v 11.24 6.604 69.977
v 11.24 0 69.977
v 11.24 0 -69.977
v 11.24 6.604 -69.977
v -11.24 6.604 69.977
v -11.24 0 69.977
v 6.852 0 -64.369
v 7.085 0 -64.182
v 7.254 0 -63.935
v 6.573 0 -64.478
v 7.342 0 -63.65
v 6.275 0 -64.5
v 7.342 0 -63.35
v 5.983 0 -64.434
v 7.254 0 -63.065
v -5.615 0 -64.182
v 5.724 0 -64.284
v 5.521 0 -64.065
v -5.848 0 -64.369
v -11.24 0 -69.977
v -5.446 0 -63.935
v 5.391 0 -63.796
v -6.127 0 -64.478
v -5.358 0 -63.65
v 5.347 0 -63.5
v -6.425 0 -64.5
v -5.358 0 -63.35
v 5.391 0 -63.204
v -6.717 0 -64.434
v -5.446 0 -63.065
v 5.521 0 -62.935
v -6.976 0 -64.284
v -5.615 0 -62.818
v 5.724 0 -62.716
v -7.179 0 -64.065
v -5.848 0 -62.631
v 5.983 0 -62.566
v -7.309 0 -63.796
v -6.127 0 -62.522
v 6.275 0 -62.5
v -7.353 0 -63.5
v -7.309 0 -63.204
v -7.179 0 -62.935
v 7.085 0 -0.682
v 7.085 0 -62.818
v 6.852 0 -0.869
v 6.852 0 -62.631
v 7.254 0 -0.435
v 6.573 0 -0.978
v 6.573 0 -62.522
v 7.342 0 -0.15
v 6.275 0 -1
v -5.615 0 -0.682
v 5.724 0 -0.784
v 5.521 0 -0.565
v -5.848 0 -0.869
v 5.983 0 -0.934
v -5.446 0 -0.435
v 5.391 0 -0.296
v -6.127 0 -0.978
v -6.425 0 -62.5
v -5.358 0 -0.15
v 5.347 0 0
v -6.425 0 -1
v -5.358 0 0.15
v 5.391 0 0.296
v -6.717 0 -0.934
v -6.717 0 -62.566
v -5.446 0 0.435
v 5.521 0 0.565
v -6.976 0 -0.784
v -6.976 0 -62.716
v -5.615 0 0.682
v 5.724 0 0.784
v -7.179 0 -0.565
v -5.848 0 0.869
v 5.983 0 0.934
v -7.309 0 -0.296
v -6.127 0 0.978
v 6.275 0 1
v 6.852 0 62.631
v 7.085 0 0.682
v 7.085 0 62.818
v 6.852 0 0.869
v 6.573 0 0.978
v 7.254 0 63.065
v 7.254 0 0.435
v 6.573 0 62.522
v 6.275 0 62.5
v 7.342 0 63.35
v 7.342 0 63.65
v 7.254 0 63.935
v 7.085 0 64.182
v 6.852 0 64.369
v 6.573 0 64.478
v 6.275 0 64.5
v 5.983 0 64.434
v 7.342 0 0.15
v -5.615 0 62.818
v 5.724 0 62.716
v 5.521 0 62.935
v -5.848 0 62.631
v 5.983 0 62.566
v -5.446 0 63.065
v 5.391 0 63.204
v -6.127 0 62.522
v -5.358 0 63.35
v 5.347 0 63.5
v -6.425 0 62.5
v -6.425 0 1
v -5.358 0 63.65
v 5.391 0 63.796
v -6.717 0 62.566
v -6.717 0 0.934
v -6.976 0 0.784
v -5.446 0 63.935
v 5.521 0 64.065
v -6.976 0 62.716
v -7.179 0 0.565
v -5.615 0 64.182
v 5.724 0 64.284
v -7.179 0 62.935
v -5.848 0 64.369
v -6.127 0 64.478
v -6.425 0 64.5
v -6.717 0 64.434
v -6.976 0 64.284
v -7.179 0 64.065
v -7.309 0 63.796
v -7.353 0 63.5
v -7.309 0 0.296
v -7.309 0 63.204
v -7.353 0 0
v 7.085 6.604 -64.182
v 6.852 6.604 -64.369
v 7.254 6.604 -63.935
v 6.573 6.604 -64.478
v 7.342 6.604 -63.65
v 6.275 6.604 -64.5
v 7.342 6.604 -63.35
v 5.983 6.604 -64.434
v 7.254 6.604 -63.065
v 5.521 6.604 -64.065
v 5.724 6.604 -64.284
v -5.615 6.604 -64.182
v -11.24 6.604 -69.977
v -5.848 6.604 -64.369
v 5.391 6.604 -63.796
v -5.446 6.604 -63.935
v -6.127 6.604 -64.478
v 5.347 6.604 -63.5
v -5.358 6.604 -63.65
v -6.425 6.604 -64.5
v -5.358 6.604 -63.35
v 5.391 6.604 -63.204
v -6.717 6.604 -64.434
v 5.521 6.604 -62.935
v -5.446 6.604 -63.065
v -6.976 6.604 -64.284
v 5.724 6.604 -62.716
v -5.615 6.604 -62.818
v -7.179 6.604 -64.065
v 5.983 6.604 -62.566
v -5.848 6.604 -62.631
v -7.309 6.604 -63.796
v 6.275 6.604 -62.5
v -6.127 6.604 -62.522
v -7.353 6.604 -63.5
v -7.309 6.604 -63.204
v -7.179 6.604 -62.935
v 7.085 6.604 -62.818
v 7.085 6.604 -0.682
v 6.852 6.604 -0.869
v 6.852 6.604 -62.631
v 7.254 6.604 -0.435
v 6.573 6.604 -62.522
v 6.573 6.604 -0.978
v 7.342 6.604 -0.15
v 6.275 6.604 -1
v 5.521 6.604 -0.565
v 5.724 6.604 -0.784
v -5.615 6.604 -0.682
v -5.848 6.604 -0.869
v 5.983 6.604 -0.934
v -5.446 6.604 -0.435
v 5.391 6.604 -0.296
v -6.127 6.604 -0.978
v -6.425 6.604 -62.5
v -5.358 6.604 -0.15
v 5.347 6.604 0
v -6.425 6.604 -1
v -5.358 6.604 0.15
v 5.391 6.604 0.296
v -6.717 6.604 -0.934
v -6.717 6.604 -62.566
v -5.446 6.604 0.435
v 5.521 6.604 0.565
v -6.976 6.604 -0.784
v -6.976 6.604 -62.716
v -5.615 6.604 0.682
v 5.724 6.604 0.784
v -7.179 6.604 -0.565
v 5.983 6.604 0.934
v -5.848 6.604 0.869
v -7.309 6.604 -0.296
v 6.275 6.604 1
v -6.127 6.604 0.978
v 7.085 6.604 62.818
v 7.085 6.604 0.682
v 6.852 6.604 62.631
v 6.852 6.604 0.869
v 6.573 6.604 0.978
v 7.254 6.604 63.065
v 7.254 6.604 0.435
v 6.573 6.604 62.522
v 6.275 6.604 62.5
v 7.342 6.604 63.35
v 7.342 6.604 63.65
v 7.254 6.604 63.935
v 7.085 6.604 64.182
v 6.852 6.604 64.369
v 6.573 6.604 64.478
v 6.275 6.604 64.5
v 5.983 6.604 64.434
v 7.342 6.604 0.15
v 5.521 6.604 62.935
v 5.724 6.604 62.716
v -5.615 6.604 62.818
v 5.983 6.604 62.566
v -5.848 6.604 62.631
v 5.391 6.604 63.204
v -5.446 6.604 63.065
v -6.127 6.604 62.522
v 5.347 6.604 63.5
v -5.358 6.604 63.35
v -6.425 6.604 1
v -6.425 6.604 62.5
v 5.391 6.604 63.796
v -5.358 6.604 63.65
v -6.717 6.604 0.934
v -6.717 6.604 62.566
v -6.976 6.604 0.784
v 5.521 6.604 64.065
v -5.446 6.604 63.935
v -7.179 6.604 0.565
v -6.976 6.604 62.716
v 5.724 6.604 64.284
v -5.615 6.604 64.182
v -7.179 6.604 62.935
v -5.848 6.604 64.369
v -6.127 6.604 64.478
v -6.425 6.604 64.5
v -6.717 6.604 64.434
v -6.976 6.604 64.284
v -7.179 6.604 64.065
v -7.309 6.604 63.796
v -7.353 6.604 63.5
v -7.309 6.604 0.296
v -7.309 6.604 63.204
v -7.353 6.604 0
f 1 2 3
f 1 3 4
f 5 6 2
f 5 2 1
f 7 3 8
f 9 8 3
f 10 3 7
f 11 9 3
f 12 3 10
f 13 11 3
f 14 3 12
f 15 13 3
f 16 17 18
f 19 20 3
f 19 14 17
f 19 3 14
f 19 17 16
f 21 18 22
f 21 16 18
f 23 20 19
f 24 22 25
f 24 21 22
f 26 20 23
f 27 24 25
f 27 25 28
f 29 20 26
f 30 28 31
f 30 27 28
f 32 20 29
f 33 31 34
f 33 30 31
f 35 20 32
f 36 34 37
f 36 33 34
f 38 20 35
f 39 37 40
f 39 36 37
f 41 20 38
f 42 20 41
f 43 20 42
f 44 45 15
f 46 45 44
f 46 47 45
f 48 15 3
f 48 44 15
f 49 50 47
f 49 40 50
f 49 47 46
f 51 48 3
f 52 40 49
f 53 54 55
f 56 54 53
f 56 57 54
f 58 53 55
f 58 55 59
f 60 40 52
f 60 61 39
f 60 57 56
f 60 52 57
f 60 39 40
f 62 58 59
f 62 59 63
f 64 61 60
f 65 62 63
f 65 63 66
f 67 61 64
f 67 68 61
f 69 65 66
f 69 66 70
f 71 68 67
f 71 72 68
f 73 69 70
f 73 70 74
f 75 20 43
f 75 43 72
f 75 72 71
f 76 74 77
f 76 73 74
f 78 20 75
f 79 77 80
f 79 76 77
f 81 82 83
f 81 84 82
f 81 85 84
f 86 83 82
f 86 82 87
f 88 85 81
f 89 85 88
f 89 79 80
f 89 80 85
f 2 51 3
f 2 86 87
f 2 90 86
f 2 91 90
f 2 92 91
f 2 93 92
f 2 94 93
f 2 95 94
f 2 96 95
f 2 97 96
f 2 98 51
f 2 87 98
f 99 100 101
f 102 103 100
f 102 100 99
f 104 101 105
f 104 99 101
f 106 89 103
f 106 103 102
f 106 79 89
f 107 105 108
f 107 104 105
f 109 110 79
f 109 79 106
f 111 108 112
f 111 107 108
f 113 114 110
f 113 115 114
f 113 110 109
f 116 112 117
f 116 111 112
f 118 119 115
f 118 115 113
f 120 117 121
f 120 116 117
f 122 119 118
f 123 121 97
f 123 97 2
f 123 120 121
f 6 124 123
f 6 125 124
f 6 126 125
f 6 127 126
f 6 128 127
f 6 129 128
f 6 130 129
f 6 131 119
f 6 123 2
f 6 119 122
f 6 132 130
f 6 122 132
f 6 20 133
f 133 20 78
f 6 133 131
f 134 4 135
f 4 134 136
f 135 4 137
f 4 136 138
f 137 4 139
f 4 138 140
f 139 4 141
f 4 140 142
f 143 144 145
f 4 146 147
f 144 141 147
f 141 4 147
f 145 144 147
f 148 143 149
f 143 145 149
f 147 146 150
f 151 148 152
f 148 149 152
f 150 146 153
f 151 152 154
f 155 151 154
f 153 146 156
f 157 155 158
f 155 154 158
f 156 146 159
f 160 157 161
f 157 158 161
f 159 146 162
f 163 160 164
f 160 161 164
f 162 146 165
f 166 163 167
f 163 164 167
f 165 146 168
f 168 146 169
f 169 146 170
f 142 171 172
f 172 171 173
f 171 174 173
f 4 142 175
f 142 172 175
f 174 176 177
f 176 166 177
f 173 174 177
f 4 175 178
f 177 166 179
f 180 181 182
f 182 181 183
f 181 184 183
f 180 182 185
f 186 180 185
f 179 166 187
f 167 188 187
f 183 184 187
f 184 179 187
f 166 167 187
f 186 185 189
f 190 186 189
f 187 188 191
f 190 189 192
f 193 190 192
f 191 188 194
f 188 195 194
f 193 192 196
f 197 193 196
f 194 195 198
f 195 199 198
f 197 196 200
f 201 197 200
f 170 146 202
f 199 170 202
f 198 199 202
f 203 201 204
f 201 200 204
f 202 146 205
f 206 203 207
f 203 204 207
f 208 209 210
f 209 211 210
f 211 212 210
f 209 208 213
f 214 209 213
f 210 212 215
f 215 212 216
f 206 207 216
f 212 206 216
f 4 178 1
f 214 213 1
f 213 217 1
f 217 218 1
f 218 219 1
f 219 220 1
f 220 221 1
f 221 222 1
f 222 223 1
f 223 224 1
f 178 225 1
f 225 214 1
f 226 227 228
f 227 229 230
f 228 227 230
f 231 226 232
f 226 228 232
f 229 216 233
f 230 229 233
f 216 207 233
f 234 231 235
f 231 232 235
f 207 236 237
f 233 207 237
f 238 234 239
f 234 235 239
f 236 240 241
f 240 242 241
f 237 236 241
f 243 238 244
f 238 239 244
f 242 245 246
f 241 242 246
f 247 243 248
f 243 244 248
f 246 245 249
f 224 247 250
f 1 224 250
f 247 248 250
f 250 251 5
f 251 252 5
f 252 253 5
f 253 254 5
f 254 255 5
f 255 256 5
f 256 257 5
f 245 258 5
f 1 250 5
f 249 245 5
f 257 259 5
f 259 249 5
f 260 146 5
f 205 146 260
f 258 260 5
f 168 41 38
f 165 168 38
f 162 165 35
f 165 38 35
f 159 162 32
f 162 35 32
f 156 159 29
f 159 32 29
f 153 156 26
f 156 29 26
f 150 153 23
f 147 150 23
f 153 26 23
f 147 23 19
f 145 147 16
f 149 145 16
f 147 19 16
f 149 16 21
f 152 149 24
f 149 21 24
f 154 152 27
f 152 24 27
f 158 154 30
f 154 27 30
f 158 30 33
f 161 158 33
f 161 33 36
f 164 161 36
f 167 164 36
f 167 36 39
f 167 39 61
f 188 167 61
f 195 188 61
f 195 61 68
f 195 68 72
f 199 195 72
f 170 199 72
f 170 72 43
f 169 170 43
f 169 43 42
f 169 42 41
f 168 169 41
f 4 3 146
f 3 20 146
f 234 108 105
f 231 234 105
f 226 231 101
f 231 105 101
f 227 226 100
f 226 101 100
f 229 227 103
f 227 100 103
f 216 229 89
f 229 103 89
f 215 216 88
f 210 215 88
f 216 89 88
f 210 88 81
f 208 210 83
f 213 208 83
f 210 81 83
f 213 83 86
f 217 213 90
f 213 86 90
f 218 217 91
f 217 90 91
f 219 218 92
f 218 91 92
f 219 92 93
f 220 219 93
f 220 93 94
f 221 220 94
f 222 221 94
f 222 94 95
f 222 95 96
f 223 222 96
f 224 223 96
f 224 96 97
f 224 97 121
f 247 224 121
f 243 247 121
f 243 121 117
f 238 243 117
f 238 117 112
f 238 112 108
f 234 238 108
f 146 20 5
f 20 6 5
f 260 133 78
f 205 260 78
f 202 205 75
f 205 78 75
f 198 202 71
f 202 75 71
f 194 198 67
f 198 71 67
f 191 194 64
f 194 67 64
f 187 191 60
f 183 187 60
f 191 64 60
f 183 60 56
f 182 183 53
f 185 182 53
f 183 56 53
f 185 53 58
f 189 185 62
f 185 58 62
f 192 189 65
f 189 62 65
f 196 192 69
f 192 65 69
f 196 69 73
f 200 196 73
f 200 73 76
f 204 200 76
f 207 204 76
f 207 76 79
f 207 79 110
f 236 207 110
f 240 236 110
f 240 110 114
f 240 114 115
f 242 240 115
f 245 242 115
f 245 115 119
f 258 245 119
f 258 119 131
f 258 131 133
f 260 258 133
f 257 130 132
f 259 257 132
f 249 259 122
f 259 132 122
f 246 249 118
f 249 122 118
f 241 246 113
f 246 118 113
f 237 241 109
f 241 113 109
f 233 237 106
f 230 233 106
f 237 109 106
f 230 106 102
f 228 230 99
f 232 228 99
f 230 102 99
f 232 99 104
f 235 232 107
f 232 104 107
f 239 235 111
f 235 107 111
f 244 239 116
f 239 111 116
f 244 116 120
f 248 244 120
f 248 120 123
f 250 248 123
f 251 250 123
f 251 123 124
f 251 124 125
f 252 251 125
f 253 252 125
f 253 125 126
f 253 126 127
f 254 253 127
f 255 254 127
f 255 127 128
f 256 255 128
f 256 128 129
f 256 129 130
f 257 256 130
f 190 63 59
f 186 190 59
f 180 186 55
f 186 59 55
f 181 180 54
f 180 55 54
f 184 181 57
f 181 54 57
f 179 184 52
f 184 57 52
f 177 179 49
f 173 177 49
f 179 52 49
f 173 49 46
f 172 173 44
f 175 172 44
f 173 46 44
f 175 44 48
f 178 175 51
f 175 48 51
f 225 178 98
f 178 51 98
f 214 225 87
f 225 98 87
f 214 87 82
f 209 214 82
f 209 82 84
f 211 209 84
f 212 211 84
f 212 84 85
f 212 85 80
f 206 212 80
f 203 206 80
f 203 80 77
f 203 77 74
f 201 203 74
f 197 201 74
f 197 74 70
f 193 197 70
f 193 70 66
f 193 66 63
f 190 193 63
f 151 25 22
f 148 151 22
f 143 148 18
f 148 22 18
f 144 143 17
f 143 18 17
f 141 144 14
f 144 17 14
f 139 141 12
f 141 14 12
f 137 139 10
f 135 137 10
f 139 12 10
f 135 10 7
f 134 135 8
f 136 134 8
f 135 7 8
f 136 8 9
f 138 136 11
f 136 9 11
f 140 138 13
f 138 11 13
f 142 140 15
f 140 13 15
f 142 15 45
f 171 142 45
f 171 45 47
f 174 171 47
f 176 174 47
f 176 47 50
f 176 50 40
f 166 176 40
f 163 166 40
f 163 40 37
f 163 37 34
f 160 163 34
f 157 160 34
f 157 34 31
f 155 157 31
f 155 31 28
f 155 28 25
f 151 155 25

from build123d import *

# Parameters (mm, degrees)
SKETCH1_W                 = 22.225
SKETCH1_H                 = 139.7
BOSS_EXTRUDE1_DEPTH       = 6.604
F_4_40_TAPPED_HOLE1_D     = 2.2606
F_4_40_TAPPED_HOLE1_DEPTH = 7.5946
F_4_40_TAPPED_HOLE1_TIP   = 0.679152758
MOVE_FACE1_BY             = 0.127
MOVE_FACE1_2_BY           = 0.127
MOVE_FACE1_3_BY           = 0.127
MOVE_FACE1_4_BY           = 0.127
MOVE_FACE1_5_BY           = 0.127
MOVE_FACE1_6_BY           = 0.127
MOVE_FACE1_7_BY           = 0.127
MOVE_FACE1_8_BY           = 0.127
MOVE_FACE1_9_BY           = 0.127
MOVE_FACE1_10_BY          = 0.127


with BuildPart() as part:
    # Sketch1 → Boss-Extrude1 (new body)
    with BuildSketch(Plane(origin=(0, 0, 0), x_dir=(1, 0, 0), z_dir=(0, 1, 0))):
        Rectangle(SKETCH1_W, SKETCH1_H)
    extrude(amount=BOSS_EXTRUDE1_DEPTH)

    # #4-40 Tapped Hole1
    with Locations(Plane(origin=(0, 6.604, 0), x_dir=(1, 0, 0), z_dir=(0, 1, 0))):
        with Locations((6.35, 63.5), (6.35, 0), (6.35, -63.5), (-6.35, 63.5), (-6.35, 0), (-6.35, -63.5)):
            Hole(F_4_40_TAPPED_HOLE1_D / 2, depth=F_4_40_TAPPED_HOLE1_DEPTH)
            with Locations((0, 0, -(F_4_40_TAPPED_HOLE1_DEPTH + F_4_40_TAPPED_HOLE1_TIP / 2))):  # 118° drill point
                Cone(0, F_4_40_TAPPED_HOLE1_D / 2, F_4_40_TAPPED_HOLE1_TIP, mode=Mode.SUBTRACT)

    # Move Face1: a face moved outward by 0.127
    extrude(part.faces().sort_by_distance((0, 3.302, 69.85))[0], amount=MOVE_FACE1_BY, dir=(0, 0, 1))

    # Move Face1 2: a curved face moved outward by 0.127
    add(Solid.thicken(part.faces().sort_by_distance((7.4803, 3.302, 0))[0], MOVE_FACE1_2_BY))

    # Move Face1 3: a curved face moved outward by 0.127
    add(Solid.thicken(part.faces().sort_by_distance((-5.2197, 3.302, 0))[0], MOVE_FACE1_3_BY))

    # Move Face1 4: a curved face moved outward by 0.127
    add(Solid.thicken(part.faces().sort_by_distance((7.4803, 3.302, 63.5))[0], MOVE_FACE1_4_BY))

    # Move Face1 5: a curved face moved outward by 0.127
    add(Solid.thicken(part.faces().sort_by_distance((-5.2197, 3.302, 63.5))[0], MOVE_FACE1_5_BY))

    # Move Face1 6: a face moved outward by 0.127
    extrude(part.faces().sort_by_distance((-11.1125, 3.302, 0))[0], amount=MOVE_FACE1_6_BY, dir=(-1, 0, 0))

    # Move Face1 7: a curved face moved outward by 0.127
    add(Solid.thicken(part.faces().sort_by_distance((-5.2197, 3.302, -63.5))[0], MOVE_FACE1_7_BY))

    # Move Face1 8: a curved face moved outward by 0.127
    add(Solid.thicken(part.faces().sort_by_distance((7.4803, 3.302, -63.5))[0], MOVE_FACE1_8_BY))

    # Move Face1 9: a face moved outward by 0.127
    extrude(part.faces().sort_by_distance((0, 3.302, -69.85))[0], amount=MOVE_FACE1_9_BY, dir=(0, 0, -1))

    # Move Face1 10: a face moved outward by 0.127
    extrude(part.faces().sort_by_distance((11.1125, 3.302, 0))[0], amount=MOVE_FACE1_10_BY, dir=(1, 0, 0))


solid = part.part
